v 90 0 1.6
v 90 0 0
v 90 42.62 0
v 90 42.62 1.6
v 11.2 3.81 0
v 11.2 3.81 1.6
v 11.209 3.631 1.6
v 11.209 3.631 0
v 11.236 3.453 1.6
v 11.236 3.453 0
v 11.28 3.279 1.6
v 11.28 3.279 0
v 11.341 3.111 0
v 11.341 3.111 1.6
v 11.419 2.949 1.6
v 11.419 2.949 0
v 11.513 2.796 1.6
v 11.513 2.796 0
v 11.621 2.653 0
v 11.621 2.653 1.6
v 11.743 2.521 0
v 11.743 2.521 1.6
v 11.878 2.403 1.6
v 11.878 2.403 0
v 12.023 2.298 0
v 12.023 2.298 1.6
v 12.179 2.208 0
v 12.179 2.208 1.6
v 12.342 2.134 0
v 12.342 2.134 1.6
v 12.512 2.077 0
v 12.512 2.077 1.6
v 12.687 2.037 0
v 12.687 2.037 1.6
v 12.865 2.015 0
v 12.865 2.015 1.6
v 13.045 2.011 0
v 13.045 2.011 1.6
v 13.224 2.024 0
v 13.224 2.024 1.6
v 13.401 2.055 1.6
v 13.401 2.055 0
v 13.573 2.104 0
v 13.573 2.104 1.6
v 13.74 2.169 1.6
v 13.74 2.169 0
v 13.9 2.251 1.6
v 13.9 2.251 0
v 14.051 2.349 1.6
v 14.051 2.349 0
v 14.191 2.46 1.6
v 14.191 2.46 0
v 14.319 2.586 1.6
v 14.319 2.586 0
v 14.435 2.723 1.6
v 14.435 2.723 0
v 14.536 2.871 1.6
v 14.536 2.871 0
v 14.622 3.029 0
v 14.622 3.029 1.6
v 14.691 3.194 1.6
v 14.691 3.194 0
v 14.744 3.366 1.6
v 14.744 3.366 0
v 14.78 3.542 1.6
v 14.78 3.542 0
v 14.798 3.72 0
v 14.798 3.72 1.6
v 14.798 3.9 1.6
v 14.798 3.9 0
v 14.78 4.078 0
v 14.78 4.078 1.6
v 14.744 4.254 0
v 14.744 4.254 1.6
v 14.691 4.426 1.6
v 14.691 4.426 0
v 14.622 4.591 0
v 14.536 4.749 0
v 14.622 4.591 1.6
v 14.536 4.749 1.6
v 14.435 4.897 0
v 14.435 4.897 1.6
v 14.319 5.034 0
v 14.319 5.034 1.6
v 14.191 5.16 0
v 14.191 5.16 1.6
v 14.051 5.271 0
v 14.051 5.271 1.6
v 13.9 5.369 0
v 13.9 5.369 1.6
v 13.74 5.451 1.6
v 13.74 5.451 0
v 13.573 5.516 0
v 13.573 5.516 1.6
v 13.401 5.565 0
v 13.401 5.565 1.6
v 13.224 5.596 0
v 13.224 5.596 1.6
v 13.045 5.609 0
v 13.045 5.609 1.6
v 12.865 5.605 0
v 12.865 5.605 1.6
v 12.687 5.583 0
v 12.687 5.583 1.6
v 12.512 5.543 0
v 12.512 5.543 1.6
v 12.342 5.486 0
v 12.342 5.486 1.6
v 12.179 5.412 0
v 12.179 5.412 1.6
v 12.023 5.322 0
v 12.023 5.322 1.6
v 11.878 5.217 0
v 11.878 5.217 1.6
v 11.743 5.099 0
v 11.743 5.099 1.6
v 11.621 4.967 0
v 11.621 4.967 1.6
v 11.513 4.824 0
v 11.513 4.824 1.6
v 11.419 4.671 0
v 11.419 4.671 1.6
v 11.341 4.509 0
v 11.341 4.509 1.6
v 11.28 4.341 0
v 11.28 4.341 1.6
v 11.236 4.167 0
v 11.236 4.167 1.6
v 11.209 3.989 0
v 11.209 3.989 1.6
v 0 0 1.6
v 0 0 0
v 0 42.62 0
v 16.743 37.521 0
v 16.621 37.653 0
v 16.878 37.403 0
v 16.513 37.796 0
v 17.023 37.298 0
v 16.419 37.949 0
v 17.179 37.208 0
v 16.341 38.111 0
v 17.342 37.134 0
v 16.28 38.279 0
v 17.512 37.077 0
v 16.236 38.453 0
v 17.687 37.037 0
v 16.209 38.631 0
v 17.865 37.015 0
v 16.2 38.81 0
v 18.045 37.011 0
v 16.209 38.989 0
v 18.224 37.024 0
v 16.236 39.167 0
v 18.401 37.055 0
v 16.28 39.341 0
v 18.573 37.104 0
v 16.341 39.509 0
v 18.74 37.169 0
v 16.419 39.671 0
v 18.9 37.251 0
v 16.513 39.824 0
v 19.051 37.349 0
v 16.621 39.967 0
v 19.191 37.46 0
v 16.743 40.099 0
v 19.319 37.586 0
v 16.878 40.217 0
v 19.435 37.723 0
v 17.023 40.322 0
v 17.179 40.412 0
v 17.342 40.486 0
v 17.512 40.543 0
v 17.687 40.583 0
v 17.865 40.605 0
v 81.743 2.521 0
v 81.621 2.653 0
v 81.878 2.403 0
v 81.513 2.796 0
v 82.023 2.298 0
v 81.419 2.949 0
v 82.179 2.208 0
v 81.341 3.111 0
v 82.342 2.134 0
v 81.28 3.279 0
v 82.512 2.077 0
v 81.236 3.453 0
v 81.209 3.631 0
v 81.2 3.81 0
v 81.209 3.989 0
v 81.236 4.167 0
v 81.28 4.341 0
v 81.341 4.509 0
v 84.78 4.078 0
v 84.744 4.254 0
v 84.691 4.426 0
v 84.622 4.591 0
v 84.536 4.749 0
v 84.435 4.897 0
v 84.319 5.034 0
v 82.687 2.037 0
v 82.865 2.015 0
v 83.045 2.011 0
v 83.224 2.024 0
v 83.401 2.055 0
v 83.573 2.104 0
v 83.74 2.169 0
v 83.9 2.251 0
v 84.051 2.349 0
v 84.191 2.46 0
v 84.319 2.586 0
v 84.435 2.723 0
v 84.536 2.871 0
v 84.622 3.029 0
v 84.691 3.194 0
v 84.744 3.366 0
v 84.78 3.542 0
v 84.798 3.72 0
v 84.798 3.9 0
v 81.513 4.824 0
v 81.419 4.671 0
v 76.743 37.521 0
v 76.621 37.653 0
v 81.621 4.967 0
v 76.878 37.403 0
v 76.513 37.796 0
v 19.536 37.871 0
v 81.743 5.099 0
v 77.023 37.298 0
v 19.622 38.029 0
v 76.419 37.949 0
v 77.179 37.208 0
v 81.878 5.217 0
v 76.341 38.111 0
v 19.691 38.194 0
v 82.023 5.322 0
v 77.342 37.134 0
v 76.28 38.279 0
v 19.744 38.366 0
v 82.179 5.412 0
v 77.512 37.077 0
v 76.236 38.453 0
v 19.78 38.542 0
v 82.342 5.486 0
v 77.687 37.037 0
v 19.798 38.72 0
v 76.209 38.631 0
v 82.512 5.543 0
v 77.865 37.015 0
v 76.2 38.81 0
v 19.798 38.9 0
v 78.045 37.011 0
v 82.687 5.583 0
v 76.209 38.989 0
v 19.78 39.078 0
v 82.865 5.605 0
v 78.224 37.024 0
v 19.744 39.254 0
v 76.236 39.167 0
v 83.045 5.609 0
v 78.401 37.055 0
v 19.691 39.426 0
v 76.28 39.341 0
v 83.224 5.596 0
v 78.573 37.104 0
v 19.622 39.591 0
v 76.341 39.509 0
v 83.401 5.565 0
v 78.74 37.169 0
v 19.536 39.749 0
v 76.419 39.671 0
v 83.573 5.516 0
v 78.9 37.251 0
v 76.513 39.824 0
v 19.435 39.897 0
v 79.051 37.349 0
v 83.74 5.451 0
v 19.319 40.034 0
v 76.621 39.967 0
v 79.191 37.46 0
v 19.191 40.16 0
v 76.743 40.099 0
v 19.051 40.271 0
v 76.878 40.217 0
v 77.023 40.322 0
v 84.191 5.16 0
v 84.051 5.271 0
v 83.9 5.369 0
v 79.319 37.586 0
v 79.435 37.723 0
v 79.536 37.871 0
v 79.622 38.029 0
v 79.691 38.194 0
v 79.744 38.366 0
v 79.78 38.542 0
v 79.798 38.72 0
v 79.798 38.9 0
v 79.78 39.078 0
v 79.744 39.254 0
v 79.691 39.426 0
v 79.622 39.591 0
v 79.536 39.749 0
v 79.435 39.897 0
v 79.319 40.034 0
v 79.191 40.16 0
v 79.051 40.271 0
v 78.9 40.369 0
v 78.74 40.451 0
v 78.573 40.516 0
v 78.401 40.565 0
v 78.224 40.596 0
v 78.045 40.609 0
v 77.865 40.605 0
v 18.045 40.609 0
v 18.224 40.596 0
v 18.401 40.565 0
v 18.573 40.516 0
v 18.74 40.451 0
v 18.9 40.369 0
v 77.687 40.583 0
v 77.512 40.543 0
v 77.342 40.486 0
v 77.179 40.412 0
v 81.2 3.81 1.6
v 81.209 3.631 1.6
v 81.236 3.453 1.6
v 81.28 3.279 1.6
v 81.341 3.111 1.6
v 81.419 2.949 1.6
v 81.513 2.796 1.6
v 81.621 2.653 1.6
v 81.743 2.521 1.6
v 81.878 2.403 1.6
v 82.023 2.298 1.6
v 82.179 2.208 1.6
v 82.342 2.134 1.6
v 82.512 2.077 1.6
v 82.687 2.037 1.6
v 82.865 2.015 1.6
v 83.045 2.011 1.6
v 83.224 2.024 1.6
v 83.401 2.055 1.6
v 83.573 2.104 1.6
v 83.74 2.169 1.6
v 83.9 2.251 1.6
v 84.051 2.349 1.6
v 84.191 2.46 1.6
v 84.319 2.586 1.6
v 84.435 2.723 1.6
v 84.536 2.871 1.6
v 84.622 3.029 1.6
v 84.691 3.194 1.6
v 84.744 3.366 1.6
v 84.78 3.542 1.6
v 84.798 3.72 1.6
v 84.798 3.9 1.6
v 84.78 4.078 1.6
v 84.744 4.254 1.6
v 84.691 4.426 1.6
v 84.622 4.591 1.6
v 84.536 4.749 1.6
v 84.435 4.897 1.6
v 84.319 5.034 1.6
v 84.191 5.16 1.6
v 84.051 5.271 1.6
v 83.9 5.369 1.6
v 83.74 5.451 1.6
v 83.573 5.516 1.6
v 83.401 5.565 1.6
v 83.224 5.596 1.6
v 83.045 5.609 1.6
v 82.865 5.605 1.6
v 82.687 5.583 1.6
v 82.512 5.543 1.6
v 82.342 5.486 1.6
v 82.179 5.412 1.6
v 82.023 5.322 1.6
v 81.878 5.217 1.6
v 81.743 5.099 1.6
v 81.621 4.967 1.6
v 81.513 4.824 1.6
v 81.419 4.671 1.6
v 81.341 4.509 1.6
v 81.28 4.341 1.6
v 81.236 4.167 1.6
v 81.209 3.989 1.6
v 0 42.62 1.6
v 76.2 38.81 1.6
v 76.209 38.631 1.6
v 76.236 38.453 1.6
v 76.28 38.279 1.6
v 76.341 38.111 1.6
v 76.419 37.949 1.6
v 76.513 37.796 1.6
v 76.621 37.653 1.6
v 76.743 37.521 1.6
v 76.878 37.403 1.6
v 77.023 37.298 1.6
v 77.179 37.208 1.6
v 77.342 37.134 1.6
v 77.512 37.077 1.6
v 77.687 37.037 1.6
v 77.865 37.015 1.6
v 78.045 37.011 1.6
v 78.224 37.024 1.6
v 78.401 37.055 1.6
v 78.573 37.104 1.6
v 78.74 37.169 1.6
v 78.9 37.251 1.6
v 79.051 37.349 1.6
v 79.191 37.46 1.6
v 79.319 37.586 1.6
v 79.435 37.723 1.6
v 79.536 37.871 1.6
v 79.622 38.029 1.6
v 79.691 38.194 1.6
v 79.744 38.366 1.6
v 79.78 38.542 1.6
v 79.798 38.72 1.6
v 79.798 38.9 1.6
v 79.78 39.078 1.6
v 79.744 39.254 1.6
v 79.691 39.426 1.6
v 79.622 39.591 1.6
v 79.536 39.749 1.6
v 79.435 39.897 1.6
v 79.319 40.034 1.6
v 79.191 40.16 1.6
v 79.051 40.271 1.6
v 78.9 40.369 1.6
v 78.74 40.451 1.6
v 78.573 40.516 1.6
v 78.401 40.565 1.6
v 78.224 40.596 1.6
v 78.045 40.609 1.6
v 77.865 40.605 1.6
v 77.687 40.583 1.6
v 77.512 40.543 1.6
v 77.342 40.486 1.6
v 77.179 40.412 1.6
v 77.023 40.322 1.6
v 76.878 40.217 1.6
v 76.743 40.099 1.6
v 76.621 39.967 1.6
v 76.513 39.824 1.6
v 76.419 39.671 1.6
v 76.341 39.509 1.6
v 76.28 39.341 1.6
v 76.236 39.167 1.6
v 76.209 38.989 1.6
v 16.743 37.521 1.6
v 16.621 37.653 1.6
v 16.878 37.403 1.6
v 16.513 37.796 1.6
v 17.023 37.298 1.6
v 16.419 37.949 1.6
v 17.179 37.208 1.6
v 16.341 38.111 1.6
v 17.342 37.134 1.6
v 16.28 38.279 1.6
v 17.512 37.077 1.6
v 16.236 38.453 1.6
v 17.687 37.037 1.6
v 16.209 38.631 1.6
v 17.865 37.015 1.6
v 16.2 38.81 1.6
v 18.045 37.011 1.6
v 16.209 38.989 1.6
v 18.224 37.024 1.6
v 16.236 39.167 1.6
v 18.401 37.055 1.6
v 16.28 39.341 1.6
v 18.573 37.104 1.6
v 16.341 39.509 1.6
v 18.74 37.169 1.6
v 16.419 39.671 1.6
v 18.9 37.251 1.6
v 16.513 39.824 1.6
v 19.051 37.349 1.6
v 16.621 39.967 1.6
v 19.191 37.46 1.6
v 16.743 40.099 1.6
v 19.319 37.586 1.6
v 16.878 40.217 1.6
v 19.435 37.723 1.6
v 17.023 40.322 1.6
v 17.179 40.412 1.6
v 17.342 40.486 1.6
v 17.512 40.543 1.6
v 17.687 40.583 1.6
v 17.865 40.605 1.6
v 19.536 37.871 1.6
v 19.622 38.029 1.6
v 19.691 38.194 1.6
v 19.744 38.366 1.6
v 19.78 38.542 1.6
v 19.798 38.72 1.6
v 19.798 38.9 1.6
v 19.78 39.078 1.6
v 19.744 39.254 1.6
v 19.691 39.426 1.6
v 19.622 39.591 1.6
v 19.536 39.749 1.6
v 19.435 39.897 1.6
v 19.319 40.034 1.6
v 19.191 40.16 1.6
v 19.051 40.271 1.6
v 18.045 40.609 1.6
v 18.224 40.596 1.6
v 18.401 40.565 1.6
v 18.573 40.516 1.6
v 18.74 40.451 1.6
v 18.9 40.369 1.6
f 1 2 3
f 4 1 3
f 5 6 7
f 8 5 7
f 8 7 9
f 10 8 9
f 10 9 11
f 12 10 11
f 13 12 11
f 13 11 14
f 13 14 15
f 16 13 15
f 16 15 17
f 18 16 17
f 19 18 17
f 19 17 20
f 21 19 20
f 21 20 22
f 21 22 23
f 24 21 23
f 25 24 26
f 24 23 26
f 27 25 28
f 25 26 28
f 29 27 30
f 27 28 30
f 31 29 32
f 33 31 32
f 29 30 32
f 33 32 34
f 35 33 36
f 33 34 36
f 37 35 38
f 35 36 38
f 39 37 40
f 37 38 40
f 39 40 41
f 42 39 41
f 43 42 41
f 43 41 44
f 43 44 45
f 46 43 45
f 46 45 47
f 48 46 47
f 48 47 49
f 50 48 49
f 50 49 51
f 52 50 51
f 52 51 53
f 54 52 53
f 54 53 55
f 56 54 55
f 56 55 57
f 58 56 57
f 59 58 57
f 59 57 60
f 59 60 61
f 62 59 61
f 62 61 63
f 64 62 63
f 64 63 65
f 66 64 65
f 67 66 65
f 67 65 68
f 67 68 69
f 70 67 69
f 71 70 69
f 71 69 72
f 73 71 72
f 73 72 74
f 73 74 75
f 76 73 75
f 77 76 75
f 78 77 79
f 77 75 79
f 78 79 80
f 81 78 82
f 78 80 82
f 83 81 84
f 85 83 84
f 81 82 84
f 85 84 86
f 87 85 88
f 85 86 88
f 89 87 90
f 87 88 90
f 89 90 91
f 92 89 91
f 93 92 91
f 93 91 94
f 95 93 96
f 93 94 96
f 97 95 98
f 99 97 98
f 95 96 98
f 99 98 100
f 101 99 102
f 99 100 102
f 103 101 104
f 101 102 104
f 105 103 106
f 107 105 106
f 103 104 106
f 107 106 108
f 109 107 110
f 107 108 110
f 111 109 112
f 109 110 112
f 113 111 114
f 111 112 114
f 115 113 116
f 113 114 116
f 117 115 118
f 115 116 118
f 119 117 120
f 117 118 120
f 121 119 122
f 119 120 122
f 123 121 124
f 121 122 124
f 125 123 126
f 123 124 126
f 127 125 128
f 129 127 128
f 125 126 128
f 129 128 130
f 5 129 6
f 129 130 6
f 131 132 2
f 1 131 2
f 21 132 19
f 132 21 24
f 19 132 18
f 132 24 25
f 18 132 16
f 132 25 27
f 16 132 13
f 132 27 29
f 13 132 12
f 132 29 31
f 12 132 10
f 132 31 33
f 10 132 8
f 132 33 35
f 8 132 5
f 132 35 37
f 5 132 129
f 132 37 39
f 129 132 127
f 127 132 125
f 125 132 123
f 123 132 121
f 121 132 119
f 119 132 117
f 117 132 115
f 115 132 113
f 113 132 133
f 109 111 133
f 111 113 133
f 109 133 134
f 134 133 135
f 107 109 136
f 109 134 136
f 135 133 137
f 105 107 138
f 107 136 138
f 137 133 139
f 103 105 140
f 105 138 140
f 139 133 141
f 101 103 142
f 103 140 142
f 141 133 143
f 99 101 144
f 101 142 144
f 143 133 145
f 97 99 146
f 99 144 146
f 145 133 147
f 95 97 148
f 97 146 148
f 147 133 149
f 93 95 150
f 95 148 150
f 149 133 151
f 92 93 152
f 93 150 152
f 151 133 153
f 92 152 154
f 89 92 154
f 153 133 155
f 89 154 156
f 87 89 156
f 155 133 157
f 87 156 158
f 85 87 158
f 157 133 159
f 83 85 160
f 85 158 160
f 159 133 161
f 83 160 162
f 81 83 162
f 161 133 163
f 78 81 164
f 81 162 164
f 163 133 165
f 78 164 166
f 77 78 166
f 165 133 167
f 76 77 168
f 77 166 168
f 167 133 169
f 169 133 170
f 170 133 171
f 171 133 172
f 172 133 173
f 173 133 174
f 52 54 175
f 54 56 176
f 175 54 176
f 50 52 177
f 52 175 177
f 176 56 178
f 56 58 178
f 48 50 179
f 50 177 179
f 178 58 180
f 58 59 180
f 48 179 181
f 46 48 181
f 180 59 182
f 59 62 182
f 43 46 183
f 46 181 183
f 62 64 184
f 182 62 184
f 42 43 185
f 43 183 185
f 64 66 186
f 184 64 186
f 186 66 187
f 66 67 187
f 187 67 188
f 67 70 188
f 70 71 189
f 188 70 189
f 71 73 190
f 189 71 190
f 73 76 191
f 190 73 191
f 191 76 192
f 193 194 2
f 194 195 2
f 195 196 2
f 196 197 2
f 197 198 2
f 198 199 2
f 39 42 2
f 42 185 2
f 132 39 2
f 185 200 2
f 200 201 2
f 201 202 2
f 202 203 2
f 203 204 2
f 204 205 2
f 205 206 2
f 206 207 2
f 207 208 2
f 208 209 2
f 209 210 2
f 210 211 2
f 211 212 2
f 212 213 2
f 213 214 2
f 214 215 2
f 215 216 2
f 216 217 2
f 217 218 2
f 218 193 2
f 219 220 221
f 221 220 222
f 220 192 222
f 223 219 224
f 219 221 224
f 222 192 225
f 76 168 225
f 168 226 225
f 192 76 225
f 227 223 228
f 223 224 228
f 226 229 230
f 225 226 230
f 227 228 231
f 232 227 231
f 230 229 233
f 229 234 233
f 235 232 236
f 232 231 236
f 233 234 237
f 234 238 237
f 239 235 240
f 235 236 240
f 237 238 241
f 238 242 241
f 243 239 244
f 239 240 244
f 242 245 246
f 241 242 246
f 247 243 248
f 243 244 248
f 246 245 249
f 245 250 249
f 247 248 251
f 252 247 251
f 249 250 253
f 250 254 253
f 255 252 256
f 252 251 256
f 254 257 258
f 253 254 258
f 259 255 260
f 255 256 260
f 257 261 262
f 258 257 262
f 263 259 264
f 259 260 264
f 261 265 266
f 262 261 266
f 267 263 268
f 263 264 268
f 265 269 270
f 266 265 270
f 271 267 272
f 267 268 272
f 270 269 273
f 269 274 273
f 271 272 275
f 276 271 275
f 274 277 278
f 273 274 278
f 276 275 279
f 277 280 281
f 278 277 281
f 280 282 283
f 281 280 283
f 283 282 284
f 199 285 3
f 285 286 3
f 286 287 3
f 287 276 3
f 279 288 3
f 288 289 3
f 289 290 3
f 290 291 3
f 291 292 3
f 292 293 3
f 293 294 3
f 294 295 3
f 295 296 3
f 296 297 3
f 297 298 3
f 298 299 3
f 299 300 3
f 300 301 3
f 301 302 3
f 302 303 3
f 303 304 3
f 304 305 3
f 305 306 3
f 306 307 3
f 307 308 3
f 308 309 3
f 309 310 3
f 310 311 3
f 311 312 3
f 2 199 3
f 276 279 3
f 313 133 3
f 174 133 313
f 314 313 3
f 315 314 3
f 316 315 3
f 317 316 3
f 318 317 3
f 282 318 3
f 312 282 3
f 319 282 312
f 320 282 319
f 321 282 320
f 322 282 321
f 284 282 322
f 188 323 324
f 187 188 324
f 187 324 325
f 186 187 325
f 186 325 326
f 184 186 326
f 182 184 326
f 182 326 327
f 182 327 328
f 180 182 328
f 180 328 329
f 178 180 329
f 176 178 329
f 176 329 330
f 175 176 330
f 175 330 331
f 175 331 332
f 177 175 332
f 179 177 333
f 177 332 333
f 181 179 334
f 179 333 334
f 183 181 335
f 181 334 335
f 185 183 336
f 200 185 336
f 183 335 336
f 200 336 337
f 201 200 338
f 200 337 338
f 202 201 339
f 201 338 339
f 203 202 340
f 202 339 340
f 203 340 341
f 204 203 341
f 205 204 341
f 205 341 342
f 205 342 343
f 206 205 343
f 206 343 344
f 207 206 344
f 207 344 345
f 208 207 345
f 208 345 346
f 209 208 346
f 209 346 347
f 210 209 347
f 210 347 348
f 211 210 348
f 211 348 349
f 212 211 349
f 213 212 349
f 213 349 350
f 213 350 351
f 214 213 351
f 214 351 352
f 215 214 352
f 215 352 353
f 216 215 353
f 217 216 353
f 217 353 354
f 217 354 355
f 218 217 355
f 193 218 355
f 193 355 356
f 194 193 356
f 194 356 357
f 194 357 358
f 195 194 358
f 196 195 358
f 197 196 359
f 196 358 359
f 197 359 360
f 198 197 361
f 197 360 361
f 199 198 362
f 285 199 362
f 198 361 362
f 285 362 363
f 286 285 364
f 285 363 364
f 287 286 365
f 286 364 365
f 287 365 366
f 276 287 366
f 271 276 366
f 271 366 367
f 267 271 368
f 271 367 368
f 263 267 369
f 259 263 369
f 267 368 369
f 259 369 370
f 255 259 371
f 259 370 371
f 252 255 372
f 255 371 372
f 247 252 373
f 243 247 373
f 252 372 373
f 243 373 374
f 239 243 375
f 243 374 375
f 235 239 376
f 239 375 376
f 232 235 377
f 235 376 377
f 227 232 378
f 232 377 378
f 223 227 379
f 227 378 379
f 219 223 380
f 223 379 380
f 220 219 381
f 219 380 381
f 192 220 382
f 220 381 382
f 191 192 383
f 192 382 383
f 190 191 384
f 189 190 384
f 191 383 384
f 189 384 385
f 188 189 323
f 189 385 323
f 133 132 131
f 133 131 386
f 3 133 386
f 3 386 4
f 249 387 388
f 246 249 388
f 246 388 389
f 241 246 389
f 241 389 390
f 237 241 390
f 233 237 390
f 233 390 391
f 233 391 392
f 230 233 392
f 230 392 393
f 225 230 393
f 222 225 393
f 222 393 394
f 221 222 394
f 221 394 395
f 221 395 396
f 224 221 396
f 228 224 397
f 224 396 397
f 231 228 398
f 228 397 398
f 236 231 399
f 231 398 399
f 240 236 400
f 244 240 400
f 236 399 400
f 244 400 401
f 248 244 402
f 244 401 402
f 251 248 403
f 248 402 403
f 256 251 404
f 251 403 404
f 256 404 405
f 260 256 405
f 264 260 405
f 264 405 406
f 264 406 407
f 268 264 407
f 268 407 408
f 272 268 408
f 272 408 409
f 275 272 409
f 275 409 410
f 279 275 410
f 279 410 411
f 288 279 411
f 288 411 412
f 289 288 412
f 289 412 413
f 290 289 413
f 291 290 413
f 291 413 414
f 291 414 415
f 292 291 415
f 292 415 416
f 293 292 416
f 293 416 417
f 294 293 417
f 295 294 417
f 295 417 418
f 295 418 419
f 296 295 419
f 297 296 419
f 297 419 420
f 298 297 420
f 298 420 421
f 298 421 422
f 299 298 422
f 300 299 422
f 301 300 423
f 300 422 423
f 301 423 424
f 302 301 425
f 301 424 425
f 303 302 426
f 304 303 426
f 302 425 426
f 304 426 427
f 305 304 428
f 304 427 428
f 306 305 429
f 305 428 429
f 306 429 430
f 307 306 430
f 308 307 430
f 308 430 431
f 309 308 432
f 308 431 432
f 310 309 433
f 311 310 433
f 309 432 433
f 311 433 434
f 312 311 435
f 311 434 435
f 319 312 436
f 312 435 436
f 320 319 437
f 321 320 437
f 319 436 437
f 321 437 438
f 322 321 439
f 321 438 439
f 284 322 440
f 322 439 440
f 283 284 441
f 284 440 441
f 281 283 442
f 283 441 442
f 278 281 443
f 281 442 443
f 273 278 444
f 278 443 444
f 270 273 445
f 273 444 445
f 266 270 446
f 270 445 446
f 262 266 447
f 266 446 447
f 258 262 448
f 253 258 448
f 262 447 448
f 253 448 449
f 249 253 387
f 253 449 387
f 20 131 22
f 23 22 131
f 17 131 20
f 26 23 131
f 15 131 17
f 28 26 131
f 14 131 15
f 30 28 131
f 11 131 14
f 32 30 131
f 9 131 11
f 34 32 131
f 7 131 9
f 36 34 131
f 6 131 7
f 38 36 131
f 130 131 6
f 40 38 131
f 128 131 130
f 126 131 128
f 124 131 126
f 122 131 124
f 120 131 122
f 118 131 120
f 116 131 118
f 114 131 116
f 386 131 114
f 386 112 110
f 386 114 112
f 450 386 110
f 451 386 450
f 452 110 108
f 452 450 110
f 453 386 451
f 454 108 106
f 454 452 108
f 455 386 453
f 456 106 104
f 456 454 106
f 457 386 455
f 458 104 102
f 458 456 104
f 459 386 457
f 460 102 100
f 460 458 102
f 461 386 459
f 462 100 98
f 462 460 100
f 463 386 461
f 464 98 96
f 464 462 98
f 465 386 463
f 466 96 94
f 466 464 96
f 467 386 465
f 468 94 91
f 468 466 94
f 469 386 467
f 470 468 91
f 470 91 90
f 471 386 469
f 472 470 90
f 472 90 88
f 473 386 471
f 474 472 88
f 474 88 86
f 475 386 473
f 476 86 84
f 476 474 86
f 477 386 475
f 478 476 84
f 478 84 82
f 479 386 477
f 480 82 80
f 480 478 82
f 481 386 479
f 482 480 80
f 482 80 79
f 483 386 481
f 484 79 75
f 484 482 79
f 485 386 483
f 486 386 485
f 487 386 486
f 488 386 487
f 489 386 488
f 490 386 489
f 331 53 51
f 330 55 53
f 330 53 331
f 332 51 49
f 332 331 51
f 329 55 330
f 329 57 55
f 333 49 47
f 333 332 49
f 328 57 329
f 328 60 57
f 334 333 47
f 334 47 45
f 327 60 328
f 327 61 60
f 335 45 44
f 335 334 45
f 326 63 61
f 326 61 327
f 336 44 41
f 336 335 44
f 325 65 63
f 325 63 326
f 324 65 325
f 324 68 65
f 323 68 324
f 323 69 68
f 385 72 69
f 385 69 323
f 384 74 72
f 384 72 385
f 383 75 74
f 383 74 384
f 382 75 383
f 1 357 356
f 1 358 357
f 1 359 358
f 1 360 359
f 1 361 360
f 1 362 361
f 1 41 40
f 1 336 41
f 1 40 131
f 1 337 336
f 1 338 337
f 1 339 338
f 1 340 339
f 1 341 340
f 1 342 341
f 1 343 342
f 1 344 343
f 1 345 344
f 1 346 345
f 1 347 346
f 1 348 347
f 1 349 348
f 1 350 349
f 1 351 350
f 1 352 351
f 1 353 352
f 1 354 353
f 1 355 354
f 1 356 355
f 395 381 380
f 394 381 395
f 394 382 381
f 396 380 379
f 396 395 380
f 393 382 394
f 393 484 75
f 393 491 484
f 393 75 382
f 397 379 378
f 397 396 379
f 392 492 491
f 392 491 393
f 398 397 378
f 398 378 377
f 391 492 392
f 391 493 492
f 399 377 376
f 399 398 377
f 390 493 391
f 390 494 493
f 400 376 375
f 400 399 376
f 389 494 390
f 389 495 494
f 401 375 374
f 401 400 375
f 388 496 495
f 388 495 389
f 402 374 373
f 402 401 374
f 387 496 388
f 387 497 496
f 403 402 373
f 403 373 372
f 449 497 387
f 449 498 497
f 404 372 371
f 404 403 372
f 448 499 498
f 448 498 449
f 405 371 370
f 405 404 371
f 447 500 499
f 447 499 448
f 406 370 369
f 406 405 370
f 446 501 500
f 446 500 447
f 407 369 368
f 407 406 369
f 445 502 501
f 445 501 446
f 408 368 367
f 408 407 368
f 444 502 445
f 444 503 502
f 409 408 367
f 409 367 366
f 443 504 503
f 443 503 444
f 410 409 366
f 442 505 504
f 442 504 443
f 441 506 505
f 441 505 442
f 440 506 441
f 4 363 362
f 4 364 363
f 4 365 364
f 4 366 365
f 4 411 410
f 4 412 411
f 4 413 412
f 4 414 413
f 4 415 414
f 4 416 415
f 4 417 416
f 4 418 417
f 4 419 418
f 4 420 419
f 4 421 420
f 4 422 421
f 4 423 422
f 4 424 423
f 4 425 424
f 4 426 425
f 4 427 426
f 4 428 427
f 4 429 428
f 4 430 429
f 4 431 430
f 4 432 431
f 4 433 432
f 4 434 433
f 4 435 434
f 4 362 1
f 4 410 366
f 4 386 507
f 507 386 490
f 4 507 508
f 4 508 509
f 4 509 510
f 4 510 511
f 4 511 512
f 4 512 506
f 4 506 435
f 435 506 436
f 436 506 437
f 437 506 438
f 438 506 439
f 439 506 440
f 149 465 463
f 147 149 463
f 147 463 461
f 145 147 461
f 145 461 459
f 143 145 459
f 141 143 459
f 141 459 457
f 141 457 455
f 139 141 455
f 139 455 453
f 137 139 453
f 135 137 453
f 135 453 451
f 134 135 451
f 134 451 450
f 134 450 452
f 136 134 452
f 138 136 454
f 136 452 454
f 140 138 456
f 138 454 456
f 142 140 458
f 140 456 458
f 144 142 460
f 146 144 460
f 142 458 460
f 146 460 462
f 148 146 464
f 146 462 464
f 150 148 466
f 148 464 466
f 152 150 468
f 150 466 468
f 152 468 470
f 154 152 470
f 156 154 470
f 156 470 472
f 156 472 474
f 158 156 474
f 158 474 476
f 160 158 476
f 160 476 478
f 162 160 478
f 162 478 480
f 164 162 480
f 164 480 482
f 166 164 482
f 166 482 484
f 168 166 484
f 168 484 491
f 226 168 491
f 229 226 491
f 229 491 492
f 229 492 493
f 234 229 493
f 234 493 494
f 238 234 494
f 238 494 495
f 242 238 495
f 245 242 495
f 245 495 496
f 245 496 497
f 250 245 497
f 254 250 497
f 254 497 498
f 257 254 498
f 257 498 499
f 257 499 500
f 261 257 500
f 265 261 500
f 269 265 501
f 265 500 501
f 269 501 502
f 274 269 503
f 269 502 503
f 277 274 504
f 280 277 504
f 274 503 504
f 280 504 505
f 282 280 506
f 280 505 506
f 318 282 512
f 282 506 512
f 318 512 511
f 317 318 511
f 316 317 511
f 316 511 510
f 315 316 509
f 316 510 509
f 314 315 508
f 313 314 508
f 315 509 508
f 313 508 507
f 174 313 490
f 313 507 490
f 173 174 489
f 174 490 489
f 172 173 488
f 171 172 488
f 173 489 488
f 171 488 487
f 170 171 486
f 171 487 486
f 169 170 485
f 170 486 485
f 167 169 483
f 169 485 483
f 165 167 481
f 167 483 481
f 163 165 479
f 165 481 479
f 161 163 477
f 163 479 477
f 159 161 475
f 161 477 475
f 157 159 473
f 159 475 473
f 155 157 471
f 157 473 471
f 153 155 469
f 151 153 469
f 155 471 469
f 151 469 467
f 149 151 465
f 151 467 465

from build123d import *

# Parameters (mm, degrees)
F0_W     = 90
F0_H     = 42.62
F1_DEPTH = 1.6
F2_D     = 3.6


with BuildPart() as f1:
    # F0 (on Top) → F1 (new body)
    with BuildSketch(Plane.XY):
        with Locations((45, 21.31)):
            Rectangle(F0_W, F0_H)
    extrude(amount=F1_DEPTH)

    # F2 (through all)
    with Locations(Plane(origin=(0, 0, 0), x_dir=(1, 0, 0), z_dir=(0, 0, -1))):
        with Locations((18, -38.81), (13, -3.81), (78, -38.81), (83, -3.81)):
            Hole(F2_D / 2)


solid = f1.part
